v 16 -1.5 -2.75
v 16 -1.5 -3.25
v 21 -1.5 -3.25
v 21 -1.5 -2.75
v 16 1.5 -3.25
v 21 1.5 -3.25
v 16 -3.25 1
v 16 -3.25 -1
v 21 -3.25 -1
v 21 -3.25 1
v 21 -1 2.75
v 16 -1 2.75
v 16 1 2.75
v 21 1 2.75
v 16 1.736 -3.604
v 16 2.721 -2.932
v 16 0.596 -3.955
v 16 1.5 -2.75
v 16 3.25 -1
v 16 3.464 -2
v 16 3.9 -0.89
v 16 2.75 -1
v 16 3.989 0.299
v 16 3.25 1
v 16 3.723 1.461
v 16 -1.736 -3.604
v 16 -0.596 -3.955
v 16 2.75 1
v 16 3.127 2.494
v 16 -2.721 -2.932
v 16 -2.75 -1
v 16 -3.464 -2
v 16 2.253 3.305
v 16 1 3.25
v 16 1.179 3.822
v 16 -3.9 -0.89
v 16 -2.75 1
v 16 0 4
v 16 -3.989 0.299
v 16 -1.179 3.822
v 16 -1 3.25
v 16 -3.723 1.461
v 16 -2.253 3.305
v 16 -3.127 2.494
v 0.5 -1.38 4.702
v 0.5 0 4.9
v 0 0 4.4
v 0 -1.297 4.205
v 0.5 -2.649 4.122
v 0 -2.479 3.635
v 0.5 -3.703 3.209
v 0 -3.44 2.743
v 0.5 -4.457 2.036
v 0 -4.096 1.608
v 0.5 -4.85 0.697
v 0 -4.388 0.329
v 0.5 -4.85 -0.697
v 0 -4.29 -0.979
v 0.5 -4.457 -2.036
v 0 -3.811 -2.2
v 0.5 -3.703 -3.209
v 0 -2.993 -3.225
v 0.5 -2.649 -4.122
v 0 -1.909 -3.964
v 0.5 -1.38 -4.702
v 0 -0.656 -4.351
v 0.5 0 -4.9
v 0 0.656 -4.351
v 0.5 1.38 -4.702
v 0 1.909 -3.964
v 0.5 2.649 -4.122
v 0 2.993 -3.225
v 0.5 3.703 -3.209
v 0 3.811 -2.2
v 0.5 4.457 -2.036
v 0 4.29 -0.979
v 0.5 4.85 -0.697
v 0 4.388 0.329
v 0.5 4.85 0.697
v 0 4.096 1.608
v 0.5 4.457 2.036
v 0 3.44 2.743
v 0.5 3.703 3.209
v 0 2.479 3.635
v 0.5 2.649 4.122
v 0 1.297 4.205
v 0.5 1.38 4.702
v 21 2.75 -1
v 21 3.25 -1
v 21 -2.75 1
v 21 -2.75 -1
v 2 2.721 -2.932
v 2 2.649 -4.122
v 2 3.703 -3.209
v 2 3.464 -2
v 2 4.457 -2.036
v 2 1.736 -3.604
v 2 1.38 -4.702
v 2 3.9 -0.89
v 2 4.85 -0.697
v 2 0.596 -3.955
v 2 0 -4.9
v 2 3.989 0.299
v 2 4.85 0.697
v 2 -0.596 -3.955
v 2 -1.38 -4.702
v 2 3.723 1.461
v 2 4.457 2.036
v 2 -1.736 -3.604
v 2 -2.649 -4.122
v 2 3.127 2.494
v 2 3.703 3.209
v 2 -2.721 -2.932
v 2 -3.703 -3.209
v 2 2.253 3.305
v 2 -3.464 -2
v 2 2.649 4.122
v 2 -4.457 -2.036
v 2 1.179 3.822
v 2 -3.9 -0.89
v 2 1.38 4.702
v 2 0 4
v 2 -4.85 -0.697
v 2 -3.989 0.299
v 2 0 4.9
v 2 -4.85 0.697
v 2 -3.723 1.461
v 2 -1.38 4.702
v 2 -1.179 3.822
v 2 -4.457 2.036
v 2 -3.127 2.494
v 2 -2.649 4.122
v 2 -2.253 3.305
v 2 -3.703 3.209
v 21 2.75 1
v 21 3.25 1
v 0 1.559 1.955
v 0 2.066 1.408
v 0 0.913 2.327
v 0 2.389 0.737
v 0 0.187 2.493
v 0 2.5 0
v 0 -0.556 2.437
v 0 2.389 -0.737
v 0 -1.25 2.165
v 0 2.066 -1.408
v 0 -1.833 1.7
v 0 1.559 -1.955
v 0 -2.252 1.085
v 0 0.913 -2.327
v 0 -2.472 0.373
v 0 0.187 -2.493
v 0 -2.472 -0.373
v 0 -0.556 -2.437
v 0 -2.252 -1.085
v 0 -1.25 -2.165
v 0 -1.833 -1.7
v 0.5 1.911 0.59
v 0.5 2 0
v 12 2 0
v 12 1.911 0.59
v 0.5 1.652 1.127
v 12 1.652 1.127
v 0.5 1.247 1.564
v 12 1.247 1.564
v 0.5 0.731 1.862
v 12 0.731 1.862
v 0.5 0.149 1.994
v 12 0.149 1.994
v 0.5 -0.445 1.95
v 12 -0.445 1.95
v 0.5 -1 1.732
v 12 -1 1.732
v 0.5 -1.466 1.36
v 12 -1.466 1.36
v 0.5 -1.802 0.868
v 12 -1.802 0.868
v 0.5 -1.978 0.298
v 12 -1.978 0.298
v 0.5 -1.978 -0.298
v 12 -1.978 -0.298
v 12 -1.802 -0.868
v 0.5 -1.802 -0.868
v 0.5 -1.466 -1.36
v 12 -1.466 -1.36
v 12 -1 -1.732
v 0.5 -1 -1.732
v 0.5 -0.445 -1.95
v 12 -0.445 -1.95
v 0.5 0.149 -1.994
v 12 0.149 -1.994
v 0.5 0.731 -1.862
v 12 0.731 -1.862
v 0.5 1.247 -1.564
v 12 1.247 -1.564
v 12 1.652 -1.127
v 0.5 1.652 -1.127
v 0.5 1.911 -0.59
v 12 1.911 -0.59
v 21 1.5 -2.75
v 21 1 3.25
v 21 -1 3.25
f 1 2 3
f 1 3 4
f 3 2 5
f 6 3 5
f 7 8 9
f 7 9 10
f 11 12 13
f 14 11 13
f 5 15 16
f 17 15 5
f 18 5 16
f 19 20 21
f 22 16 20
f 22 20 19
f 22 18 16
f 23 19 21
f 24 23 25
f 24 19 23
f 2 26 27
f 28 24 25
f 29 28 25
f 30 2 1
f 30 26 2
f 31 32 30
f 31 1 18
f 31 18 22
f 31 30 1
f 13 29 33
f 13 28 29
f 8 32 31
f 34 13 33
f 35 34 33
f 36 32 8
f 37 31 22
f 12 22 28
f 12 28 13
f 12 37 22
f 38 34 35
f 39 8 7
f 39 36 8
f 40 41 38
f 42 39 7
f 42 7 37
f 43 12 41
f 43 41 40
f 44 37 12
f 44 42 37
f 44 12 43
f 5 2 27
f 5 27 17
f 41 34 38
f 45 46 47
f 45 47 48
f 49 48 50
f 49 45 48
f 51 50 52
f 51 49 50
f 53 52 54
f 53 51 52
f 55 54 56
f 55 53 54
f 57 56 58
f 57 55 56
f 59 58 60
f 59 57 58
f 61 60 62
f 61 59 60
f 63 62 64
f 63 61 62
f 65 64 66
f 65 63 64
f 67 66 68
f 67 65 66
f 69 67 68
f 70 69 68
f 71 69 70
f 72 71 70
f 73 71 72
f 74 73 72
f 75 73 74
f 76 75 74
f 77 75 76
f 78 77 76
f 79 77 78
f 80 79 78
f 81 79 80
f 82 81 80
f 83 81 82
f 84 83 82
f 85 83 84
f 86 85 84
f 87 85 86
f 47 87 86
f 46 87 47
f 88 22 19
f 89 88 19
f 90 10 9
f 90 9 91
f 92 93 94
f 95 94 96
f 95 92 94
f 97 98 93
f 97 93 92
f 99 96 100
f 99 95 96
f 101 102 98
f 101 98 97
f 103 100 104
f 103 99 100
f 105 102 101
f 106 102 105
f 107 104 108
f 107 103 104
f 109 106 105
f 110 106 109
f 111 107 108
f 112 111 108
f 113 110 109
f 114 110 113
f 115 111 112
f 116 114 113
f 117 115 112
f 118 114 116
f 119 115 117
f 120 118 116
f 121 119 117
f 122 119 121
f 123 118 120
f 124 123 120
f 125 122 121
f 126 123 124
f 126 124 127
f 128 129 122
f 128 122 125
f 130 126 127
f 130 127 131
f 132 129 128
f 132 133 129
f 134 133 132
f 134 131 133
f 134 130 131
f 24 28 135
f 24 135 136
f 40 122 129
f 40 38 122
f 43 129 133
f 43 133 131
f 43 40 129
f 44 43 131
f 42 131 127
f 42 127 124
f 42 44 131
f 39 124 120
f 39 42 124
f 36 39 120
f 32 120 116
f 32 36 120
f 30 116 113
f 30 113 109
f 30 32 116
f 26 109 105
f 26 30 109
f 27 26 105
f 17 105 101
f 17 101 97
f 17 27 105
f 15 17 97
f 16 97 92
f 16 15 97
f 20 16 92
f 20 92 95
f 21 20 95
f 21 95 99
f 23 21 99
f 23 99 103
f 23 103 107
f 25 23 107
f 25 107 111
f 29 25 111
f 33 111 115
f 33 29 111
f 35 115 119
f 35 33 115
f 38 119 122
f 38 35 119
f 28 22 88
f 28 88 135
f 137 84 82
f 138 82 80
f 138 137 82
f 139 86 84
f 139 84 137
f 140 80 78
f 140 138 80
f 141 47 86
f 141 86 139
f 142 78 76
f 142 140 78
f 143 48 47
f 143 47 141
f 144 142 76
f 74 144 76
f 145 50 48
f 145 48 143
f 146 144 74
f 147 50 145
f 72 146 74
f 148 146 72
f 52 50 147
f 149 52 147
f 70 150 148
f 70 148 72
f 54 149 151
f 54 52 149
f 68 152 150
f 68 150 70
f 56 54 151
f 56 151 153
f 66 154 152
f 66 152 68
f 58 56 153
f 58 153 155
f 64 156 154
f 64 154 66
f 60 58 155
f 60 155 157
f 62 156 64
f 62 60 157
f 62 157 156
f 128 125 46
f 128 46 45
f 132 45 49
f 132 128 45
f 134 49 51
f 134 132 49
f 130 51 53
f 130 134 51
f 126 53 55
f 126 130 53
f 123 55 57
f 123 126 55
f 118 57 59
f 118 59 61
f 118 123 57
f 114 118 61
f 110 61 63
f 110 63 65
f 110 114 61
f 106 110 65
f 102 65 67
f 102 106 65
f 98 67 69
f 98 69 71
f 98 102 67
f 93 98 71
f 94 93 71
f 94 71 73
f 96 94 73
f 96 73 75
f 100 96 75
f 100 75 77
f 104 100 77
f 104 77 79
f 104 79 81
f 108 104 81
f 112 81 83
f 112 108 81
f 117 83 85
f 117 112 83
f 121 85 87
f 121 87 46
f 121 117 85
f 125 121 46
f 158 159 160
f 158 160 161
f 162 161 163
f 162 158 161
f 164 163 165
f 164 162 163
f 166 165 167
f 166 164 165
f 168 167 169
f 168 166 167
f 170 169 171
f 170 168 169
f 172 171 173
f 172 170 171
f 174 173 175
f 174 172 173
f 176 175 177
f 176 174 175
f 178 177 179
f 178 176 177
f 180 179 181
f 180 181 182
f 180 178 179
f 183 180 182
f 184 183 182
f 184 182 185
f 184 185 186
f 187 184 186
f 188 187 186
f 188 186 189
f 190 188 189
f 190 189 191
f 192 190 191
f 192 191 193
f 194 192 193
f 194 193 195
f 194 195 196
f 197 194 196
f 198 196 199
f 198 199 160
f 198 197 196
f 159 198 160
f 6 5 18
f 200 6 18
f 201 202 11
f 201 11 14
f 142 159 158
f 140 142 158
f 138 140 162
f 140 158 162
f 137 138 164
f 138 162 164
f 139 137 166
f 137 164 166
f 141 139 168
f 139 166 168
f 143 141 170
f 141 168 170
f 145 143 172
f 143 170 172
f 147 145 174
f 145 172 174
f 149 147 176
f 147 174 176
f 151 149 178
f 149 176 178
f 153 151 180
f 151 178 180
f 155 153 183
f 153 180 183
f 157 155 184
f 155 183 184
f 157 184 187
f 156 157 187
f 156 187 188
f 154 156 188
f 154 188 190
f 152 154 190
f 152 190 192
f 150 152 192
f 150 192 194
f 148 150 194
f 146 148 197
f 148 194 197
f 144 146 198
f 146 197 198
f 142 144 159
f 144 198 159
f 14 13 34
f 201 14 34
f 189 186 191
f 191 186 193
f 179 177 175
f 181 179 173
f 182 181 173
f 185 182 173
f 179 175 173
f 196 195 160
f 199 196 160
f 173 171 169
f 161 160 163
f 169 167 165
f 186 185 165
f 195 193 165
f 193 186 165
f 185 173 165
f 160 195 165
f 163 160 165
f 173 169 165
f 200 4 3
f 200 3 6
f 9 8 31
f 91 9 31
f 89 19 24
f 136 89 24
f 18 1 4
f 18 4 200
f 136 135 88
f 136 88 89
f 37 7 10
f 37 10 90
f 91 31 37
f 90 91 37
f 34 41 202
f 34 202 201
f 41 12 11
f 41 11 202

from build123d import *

# Parameters (mm, degrees)
SKETCH001_W   = 3
SKETCH001_H   = 0.5
SKETCH001_W_2 = 2
SKETCH001_W_3 = 0.5
SKETCH001_H_2 = 2
PAD_DEPTH     = 5
SKETCH002_R   = 2
POCKET_DEPTH  = 12
CHAMFER_SIZE  = 0.5


with BuildPart() as part:
    # Sketch → Revolution (revolve)
    with BuildSketch(Plane.XZ):
        Polygon((0, 0), (0, 4.9), (2, 4.9), (2, 4), (16, 4), (16, 0), align=None)
    revolve(axis=Axis((0, 0, 0), (1, 0, 0)))

    # Sketch001 → Pad (new body)
    with BuildSketch(Plane.YZ.offset(16)):
        with Locations((0, -3)):
            Rectangle(SKETCH001_W, SKETCH001_H)
        with Locations((0, 3)):
            Rectangle(SKETCH001_W_2, SKETCH001_H)
        with Locations((3, 0)):
            Rectangle(SKETCH001_W_3, SKETCH001_H_2)
        with Locations((-3, 0)):
            Rectangle(SKETCH001_W_3, SKETCH001_H_2)
    extrude(amount=PAD_DEPTH)

    # Sketch002 → Pocket (cut)
    with BuildSketch(Plane.YZ):
        Circle(SKETCH002_R)
    extrude(amount=POCKET_DEPTH, mode=Mode.SUBTRACT)

    # Chamfer
    chamfer_edges = [part.edges().sort_by_distance(p)[0] for p in [
        (0, 0, -4.9),
        (0, -2, 0),
    ]]
    chamfer(chamfer_edges, length=CHAMFER_SIZE)


solid = part.part
